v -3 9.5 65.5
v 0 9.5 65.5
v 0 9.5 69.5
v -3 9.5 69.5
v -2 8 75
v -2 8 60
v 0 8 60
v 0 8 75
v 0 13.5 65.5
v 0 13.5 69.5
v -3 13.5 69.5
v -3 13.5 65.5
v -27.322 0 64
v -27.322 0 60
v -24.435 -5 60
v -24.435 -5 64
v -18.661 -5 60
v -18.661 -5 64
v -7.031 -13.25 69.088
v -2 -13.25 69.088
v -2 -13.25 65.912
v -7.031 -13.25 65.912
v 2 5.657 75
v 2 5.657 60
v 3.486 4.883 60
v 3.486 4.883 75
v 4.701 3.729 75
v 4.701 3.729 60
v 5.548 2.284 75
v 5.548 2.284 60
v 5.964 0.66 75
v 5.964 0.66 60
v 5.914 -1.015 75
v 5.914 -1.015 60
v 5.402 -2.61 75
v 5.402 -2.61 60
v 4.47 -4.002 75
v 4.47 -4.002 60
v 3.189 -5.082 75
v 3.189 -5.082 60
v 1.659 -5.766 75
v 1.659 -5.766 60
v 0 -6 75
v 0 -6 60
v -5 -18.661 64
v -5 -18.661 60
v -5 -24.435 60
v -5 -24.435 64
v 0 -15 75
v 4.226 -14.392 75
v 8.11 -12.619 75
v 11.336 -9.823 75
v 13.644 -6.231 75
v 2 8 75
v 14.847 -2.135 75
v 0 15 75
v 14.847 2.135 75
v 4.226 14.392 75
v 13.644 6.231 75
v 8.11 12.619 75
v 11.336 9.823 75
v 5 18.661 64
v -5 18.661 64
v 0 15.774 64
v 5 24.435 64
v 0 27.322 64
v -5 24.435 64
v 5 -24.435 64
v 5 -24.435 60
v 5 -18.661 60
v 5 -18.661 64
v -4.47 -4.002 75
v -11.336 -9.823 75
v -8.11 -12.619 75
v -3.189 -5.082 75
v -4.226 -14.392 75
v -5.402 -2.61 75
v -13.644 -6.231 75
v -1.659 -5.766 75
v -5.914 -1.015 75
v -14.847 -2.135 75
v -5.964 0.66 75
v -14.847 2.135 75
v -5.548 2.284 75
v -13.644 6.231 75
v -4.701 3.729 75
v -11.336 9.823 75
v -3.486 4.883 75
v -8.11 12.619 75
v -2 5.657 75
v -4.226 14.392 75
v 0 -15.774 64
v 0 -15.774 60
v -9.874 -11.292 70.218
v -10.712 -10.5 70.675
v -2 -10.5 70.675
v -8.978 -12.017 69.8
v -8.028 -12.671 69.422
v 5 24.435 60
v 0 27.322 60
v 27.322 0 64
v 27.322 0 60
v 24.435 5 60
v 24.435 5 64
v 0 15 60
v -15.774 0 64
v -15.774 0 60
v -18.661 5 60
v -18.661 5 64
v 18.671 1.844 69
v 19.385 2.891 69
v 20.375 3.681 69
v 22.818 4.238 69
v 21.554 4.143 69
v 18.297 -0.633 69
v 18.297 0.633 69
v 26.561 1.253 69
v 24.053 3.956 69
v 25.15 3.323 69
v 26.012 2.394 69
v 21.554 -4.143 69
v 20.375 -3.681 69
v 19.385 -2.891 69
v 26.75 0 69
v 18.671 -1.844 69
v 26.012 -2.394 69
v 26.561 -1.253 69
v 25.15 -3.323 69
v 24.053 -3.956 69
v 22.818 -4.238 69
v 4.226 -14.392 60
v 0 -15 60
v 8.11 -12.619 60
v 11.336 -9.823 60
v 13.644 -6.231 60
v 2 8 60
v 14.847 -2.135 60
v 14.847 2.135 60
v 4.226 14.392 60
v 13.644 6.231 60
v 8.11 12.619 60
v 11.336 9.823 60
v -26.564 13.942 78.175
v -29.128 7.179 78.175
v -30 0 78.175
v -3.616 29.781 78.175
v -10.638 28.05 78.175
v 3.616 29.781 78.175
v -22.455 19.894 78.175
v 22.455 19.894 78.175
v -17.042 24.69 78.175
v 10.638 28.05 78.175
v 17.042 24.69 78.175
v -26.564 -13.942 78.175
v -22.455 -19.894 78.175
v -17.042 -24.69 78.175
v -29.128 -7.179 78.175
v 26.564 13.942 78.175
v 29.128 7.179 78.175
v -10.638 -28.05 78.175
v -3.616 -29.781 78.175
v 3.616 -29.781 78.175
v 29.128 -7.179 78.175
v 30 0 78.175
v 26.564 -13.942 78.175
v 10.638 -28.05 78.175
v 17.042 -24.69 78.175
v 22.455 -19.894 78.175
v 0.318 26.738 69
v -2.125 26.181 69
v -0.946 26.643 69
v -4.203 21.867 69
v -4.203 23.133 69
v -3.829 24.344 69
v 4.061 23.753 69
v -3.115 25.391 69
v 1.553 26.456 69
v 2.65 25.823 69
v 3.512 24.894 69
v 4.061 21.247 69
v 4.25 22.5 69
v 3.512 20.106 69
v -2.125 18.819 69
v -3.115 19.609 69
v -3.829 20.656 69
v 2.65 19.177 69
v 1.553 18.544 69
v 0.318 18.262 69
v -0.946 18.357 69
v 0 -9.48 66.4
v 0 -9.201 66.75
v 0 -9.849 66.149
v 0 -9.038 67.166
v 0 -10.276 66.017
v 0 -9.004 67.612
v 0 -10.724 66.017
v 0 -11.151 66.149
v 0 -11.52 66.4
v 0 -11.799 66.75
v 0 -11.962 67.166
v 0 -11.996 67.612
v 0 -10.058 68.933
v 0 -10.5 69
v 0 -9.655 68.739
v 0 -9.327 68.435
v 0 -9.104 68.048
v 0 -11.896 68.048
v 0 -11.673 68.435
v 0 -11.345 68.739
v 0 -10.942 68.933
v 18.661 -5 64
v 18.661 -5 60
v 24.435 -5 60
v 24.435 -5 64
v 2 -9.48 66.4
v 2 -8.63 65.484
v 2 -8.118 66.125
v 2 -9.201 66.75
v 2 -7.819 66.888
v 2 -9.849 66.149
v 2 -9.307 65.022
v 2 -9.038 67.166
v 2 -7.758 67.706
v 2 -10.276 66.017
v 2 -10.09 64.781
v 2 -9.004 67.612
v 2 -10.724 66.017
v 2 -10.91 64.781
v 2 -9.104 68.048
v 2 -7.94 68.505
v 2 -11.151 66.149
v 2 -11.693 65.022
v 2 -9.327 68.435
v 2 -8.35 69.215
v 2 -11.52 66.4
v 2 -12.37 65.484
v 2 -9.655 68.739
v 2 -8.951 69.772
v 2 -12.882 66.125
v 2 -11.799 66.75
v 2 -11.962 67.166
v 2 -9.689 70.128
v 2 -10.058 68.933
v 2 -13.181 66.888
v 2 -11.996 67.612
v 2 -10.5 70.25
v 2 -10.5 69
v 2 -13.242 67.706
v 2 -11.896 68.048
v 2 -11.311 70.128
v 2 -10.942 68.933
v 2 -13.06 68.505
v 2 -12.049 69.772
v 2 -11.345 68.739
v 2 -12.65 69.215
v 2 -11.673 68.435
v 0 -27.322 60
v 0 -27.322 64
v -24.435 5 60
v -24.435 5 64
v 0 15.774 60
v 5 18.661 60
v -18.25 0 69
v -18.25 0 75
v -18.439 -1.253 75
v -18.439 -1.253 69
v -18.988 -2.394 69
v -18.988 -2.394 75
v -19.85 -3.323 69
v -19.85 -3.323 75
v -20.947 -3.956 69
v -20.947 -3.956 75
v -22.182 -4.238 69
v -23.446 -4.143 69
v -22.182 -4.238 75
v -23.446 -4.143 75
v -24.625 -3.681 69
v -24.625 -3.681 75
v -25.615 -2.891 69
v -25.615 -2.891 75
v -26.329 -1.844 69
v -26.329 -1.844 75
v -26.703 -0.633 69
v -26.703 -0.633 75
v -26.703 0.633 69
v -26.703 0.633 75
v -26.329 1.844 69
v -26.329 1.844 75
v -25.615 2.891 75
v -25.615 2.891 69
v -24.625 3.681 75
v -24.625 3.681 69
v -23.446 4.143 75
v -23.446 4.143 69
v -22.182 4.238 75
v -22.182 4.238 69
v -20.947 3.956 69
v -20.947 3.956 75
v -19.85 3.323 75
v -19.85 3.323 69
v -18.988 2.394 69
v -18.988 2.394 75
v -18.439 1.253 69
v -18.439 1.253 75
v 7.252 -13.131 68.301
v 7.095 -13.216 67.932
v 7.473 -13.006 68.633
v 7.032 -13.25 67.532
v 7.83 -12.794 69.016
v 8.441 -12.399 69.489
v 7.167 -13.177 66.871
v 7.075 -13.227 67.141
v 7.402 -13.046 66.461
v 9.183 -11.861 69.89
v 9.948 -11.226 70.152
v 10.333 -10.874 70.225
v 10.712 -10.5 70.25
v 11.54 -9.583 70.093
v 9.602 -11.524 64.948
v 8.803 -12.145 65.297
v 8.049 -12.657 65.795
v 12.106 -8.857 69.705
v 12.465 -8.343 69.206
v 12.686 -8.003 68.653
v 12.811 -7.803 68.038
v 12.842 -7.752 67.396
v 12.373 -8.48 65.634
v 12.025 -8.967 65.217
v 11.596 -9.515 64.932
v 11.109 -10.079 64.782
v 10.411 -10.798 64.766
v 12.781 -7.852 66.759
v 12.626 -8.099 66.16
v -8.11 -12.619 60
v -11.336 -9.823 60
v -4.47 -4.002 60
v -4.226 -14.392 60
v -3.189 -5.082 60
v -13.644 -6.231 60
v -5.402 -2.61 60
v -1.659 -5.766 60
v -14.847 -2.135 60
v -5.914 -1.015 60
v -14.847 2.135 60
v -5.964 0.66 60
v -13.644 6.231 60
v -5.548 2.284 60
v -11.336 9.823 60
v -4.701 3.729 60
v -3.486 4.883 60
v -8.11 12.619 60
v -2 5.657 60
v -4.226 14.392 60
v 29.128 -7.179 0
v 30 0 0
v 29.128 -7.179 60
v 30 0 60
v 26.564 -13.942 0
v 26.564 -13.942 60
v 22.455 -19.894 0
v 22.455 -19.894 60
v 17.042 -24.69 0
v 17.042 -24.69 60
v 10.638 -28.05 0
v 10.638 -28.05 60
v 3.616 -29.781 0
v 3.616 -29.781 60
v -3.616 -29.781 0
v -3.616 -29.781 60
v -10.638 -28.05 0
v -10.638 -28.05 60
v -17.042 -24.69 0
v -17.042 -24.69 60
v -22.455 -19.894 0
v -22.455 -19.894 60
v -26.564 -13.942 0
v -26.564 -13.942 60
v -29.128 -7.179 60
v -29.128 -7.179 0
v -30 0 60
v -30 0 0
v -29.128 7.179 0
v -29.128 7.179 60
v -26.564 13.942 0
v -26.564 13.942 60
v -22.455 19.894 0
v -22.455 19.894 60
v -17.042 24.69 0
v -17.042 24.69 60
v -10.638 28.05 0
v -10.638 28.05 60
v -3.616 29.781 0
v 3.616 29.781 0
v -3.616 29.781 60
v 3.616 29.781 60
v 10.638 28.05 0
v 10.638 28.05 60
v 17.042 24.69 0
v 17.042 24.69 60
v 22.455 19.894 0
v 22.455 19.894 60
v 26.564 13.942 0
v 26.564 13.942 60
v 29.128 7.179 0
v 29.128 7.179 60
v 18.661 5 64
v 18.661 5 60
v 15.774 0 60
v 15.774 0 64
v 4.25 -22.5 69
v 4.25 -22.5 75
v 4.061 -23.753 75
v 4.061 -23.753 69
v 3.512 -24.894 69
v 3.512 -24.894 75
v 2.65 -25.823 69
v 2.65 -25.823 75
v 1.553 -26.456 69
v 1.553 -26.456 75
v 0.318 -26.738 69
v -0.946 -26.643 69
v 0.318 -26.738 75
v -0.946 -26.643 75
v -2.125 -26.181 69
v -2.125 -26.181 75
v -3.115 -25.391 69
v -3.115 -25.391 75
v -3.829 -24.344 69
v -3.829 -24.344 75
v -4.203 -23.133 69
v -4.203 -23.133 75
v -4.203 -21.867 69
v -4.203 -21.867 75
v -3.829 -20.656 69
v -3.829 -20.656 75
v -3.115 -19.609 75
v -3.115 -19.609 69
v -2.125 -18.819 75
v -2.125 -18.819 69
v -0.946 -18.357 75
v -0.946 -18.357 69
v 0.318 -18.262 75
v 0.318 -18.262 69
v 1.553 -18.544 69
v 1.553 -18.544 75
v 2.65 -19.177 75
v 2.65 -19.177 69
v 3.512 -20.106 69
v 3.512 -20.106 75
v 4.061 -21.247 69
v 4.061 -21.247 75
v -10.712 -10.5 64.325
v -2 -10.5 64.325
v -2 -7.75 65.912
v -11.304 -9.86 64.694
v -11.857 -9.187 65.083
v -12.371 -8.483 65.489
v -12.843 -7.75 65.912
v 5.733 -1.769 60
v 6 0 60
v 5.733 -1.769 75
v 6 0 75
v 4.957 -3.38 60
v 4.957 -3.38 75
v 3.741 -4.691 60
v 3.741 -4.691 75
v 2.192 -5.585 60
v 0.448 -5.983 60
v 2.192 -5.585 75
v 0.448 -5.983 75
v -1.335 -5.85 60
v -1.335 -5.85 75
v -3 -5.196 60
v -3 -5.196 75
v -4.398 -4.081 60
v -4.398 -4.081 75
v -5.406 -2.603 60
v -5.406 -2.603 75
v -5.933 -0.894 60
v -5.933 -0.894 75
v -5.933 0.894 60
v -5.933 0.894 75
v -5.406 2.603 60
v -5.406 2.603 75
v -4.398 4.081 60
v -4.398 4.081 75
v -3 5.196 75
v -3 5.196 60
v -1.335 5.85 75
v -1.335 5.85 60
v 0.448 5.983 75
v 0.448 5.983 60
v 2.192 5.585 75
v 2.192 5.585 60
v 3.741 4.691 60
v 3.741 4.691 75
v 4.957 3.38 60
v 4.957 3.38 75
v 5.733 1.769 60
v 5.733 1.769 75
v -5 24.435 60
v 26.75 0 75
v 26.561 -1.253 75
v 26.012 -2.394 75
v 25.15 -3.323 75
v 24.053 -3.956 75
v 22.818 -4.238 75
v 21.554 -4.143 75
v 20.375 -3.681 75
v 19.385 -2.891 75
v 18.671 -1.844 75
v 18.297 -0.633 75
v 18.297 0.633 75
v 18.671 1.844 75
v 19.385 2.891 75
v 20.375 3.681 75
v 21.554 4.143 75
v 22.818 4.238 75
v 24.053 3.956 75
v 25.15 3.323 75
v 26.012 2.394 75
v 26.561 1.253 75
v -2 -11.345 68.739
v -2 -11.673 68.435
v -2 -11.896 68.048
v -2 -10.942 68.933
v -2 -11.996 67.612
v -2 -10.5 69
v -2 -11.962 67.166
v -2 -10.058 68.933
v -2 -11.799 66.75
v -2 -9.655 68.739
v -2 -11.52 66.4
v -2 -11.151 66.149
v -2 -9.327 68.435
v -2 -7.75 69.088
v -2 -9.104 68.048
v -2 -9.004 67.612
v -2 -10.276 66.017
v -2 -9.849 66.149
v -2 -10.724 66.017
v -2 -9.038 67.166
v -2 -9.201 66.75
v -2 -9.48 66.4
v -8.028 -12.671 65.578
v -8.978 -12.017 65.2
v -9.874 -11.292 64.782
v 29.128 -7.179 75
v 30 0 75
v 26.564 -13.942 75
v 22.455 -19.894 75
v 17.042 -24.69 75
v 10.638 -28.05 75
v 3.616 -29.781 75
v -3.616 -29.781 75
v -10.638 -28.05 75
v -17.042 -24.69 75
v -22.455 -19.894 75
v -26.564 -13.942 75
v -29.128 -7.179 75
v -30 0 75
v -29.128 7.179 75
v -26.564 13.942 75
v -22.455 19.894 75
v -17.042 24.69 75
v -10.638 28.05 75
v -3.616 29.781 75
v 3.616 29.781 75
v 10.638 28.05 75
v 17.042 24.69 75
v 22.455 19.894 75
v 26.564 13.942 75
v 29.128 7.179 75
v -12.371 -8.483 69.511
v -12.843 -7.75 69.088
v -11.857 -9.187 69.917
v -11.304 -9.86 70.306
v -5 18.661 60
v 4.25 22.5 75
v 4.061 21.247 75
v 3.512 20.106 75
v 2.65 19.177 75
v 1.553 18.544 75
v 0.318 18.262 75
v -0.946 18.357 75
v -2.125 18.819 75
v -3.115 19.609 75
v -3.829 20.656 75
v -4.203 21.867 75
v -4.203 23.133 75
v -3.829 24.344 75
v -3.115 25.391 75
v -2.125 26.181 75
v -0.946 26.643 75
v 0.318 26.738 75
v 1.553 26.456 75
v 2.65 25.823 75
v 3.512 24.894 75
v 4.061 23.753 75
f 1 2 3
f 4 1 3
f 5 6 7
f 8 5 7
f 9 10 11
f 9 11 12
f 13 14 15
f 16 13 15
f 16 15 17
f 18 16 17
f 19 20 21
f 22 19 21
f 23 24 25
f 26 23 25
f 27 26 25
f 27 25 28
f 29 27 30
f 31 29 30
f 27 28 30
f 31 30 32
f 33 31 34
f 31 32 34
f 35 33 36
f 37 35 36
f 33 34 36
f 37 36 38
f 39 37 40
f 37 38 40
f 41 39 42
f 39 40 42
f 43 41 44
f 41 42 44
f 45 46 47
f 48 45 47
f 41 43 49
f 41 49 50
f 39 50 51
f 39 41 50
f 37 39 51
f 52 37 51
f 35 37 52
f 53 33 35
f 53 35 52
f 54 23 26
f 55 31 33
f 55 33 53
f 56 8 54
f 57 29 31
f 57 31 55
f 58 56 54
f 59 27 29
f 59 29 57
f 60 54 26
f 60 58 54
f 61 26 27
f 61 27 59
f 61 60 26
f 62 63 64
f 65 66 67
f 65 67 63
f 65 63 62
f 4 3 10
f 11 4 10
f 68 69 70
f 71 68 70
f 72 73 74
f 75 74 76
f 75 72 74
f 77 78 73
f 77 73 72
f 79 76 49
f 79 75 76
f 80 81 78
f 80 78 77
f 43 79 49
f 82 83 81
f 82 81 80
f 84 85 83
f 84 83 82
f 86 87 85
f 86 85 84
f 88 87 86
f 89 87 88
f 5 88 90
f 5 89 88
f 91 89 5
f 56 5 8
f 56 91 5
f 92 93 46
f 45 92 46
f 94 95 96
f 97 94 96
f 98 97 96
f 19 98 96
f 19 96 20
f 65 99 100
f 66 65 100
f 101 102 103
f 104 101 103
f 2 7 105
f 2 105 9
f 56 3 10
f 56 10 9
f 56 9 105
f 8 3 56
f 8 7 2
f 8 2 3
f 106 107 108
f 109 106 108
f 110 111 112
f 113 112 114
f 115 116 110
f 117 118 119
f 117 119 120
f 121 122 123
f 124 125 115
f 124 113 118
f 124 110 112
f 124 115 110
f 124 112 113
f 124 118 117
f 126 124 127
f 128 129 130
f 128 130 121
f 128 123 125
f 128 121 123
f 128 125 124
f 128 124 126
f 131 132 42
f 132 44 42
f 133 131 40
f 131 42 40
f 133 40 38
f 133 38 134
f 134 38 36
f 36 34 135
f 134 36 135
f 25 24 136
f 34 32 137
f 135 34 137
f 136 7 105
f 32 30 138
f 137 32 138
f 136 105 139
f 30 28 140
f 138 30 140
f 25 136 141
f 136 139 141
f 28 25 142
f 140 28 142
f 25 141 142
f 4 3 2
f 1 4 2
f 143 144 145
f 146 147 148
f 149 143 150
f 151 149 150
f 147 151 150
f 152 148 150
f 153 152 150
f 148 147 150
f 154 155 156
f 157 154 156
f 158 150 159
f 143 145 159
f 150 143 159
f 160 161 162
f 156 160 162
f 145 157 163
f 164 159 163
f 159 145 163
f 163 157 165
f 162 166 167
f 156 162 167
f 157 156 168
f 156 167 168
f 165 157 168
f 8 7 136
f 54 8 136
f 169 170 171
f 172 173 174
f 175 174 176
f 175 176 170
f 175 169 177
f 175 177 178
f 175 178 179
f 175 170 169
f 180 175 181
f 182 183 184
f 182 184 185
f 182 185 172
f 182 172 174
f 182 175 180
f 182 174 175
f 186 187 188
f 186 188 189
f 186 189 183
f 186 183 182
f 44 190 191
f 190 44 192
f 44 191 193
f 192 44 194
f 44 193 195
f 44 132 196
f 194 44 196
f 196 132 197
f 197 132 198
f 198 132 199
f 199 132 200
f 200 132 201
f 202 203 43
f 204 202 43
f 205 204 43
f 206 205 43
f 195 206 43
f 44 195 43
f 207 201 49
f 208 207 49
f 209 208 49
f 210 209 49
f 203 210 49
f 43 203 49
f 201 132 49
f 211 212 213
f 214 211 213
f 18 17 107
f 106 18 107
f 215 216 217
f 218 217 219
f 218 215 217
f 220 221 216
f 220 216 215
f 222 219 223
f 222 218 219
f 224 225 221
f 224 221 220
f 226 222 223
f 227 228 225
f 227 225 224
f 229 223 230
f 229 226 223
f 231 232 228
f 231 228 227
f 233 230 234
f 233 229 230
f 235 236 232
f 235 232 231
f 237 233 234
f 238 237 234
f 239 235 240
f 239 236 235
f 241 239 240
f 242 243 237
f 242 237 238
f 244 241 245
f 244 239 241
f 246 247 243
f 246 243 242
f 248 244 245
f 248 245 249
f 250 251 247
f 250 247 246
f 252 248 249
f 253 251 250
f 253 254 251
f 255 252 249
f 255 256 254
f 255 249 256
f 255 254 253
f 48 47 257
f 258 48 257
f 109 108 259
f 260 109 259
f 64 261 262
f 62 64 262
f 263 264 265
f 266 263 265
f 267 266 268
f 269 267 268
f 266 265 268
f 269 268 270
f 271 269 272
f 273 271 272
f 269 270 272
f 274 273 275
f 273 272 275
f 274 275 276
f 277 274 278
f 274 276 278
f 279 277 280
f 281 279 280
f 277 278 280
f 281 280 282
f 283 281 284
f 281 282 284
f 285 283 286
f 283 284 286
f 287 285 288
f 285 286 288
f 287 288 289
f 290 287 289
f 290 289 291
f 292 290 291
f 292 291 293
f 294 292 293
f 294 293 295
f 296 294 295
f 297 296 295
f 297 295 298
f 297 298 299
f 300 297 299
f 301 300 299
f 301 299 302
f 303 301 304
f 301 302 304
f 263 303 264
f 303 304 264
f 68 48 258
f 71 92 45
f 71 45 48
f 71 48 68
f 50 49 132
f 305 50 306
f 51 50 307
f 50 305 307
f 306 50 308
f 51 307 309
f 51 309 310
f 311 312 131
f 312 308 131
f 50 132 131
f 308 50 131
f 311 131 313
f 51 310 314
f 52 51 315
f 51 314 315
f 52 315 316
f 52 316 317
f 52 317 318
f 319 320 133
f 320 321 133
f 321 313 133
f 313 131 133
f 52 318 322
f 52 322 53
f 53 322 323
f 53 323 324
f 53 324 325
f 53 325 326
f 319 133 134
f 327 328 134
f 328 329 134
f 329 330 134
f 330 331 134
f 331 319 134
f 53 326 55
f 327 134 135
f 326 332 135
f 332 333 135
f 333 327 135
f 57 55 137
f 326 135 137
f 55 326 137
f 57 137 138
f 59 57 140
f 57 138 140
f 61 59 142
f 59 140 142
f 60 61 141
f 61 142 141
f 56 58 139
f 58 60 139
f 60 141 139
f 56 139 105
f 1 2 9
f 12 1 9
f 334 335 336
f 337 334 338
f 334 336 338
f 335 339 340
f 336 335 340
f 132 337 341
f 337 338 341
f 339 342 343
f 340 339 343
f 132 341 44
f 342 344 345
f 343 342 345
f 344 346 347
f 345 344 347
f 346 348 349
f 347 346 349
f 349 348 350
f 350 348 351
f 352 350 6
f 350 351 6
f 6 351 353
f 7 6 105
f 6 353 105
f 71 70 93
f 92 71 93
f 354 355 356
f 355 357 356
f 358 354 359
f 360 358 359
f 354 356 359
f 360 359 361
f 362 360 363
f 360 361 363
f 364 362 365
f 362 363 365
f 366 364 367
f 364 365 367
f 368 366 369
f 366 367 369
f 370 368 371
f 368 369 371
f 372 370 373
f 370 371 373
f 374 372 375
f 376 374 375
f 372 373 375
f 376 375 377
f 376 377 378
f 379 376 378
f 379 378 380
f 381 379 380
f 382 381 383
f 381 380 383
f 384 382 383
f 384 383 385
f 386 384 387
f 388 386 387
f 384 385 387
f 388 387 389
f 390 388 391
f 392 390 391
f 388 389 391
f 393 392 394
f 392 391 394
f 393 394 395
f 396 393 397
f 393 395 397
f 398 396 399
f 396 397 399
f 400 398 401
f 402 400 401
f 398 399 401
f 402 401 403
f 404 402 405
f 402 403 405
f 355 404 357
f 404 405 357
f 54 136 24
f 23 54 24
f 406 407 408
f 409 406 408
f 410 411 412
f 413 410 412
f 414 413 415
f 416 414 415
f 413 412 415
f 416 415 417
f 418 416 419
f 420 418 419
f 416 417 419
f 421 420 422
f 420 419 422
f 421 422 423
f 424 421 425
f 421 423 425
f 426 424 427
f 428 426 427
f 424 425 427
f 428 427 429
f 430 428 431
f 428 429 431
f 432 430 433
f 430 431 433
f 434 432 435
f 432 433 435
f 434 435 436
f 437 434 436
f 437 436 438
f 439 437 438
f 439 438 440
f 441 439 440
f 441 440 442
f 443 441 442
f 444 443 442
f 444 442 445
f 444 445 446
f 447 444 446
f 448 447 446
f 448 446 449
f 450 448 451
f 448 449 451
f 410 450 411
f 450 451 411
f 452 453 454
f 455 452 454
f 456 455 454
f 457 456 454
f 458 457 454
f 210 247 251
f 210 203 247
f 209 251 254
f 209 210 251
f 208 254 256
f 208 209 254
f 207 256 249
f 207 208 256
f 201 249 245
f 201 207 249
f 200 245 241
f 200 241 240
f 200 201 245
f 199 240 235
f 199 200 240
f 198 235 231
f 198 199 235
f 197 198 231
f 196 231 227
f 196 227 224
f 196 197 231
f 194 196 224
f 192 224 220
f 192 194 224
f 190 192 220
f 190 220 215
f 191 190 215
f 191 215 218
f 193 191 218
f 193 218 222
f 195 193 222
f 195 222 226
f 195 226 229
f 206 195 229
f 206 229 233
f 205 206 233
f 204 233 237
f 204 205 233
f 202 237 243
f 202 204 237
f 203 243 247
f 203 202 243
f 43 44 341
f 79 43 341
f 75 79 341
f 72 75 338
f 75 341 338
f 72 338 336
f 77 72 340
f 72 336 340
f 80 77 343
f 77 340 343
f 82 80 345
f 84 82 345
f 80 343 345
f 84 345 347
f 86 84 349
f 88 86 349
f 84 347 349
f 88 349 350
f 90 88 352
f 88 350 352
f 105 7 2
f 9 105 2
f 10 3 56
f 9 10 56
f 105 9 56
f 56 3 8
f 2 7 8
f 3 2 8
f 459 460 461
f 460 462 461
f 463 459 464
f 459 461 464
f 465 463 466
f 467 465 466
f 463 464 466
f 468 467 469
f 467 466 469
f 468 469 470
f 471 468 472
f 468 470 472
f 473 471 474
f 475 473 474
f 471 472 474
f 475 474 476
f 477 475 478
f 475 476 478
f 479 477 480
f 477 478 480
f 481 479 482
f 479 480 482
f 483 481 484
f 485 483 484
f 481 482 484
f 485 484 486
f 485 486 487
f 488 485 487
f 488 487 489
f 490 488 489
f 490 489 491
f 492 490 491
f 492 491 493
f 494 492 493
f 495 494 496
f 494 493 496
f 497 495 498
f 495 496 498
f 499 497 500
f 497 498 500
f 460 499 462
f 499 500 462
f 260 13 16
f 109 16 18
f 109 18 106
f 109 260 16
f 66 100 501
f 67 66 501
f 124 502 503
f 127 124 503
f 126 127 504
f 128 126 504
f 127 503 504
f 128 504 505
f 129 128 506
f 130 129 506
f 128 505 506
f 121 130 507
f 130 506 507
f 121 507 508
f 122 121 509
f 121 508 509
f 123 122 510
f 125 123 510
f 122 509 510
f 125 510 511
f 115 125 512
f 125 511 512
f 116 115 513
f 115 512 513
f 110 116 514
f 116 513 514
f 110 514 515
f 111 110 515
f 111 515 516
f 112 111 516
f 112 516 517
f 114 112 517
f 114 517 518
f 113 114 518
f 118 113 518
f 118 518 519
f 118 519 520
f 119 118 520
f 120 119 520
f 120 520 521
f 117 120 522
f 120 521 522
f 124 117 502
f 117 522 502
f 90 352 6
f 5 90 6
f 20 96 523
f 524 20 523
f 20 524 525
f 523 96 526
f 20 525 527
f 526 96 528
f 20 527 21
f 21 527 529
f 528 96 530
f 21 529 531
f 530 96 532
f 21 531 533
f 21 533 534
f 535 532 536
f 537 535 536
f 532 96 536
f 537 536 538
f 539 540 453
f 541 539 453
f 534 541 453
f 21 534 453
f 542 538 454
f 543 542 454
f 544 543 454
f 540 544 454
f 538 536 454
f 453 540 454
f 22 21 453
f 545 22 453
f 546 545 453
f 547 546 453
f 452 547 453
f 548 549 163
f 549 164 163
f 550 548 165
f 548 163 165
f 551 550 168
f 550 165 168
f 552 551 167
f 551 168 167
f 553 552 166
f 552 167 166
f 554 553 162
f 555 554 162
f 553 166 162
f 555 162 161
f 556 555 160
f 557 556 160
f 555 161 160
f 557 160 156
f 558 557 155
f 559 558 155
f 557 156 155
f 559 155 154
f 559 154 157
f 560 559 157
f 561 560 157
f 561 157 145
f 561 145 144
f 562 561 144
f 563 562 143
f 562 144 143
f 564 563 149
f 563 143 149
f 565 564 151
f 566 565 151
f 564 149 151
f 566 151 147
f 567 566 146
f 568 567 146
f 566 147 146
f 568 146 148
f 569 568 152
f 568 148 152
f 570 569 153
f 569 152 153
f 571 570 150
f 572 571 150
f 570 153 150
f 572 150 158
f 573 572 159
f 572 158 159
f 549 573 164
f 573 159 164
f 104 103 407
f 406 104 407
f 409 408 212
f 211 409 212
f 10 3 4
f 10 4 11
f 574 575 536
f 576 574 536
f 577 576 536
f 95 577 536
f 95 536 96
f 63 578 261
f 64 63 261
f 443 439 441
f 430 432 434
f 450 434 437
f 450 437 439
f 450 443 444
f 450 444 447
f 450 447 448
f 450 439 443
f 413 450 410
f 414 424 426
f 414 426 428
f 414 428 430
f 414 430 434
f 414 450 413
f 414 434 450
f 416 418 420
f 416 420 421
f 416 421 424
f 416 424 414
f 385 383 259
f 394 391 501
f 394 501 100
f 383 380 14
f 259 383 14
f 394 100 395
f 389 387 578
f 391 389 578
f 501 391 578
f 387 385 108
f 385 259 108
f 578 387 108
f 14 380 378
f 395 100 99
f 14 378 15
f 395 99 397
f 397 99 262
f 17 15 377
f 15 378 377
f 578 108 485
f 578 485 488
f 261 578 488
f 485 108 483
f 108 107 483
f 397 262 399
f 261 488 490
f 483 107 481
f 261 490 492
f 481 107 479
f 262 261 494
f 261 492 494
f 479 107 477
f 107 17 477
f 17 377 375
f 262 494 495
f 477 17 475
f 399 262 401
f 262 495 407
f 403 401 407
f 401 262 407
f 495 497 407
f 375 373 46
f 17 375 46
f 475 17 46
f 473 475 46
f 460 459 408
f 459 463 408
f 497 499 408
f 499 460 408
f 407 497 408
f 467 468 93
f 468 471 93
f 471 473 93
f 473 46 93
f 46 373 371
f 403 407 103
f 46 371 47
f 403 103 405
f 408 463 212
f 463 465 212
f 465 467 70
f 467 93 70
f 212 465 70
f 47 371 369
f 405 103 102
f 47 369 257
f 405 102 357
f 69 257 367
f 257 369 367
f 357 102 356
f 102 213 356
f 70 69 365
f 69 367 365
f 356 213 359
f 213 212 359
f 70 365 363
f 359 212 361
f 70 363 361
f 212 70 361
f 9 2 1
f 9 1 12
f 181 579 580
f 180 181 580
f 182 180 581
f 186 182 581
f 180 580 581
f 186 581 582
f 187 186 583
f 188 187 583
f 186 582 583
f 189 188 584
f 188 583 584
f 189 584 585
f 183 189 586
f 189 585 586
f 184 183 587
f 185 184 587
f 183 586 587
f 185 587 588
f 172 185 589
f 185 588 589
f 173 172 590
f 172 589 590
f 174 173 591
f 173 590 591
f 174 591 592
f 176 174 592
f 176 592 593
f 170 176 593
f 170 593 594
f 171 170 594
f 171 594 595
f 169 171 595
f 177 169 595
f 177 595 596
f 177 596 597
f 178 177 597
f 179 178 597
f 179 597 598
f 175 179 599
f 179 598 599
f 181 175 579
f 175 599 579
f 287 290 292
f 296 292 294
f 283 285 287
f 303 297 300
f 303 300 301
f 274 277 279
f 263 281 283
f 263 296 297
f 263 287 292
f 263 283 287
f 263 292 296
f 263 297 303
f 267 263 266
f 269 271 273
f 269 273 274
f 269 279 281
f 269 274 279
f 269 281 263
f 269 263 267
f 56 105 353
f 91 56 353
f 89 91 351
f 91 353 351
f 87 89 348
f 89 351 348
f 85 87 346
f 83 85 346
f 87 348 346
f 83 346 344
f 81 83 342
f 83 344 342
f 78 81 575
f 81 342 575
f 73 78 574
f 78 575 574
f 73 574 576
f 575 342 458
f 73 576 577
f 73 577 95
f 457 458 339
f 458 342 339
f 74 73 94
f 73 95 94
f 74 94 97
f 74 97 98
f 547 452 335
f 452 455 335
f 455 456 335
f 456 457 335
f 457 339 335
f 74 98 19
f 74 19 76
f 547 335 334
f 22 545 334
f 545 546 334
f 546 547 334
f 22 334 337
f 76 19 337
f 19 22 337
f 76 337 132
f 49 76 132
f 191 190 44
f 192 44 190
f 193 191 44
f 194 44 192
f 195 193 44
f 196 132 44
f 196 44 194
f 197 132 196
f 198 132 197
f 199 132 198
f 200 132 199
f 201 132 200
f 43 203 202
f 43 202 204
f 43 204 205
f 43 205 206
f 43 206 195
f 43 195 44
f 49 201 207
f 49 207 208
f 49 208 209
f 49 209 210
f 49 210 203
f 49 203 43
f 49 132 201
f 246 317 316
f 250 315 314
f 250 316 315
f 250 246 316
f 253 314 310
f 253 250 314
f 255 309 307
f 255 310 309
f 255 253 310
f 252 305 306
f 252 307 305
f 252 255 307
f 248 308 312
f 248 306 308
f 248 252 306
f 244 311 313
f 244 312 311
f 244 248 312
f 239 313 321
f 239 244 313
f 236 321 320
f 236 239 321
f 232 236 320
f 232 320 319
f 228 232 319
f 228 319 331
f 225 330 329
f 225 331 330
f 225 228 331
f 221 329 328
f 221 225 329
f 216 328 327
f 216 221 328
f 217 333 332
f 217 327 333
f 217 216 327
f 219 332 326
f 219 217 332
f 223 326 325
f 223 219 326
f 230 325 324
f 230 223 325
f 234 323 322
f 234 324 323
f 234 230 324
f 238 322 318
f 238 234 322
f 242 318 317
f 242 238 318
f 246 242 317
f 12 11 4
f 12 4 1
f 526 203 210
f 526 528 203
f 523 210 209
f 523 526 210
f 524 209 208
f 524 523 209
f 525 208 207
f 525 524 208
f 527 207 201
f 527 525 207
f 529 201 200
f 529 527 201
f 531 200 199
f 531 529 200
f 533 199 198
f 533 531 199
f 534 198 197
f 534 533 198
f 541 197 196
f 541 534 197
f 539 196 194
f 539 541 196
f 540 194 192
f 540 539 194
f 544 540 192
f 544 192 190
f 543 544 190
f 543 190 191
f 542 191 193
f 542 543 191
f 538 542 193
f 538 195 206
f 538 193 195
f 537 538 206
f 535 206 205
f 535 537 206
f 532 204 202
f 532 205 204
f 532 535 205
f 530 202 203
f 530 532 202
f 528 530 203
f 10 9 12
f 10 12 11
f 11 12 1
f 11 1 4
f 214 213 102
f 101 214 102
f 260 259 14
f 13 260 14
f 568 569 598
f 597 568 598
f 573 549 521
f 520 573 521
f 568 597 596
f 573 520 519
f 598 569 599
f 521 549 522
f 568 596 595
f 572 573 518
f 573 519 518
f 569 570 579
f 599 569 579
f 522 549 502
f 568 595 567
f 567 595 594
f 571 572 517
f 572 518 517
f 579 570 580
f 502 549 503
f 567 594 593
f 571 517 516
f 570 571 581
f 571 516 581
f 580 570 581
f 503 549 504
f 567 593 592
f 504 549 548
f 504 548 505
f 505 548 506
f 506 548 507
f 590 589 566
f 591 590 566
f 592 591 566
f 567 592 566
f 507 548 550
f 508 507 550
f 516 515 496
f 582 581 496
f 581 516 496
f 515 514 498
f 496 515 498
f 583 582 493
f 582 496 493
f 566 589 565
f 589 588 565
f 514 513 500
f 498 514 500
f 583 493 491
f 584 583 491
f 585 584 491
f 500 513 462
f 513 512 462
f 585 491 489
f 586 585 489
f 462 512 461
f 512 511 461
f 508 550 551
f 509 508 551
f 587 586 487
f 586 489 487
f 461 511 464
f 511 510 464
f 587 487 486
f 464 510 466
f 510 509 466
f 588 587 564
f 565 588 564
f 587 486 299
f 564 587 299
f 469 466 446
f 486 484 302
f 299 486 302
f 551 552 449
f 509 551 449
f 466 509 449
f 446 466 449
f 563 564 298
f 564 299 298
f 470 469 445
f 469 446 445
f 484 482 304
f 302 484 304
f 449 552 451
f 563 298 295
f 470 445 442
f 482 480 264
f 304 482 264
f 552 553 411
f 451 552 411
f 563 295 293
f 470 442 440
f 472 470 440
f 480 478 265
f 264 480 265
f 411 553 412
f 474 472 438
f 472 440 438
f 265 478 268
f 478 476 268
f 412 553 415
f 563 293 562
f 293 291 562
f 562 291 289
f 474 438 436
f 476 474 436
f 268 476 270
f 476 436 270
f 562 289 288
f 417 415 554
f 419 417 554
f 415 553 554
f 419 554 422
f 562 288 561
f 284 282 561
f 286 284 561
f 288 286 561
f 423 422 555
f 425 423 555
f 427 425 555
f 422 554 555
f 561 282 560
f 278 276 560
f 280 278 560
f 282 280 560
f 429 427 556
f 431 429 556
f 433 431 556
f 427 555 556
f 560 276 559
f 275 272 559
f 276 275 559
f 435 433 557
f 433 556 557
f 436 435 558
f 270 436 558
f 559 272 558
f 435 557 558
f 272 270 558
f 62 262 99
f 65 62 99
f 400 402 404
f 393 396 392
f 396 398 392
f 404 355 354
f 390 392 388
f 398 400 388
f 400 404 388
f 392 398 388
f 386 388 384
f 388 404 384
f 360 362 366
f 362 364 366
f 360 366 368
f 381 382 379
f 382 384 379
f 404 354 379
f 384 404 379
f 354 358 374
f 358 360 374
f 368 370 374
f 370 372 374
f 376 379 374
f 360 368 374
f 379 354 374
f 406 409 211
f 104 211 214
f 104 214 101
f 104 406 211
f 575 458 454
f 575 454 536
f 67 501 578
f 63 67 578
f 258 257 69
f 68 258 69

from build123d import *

# Parameters (mm, degrees)
BOSS_EXTRUDE1_DEPTH     = 4
SKETCH4_R               = 4.25
BOSS_EXTRUDE2_DEPTH     = 6
SKETCH5_R               = 15
BOSS_EXTRUDE3_DEPTH     = 15
CUT_EXTRUDE1_DEPTH      = 2
CUT_EXTRUDE1_DEPTH_BACK = 91.373284908
SKETCH10_W              = 4
SKETCH10_H              = 4
BOSS_EXTRUDE4_DEPTH     = 3
SKETCH11_W              = 4
SKETCH11_H              = 4
CUT_EXTRUDE2_DEPTH      = 3


with BuildPart() as part:
    # Sketch2 → Revolve1 (revolve)
    with BuildSketch(Plane(origin=(0, 0, 0), x_dir=(0, 0, -1), z_dir=(1, 0, 0)), mode=Mode.PRIVATE) as revolve1_sk:
        Polygon((0, 0), (0, 30), (-60, 30), (-60, 6), (-75, 6), (-75, 30), (-78.175, 30), (-78.175, 0), align=None)
    revolve(revolve1_sk.sketch.rotate(Axis((0, 0, 1885.789937519), (0, 0, -1)), 90), axis=Axis((0, 0, 1885.789937519), (0, 0, -1)))

    # Sketch3 → Boss-Extrude1 (add)
    with BuildSketch(Plane.XY.offset(60)):
        Polygon((15.774497248, 0), (18.661248594, -5), (24.434751286, -5), (27.321502632, 0), (24.434751286, 5), (18.661248594, 5), align=None)
        Polygon((0, 15.774497248), (5, 18.661248594), (5, 24.434751286), (0, 27.321502632), (-5, 24.434751286), (-5, 18.661248594), align=None)
        Polygon((0, -15.774497248), (-5, -18.661248594), (-5, -24.434751286), (0, -27.321502632), (5, -24.434751286), (5, -18.661248594), align=None)
        Polygon((-15.774497248, 0), (-18.661248594, 5), (-24.434751286, 5), (-27.321502632, 0), (-24.434751286, -5), (-18.661248594, -5), align=None)
    extrude(amount=BOSS_EXTRUDE1_DEPTH)

    # Sketch4 → Boss-Extrude2 (add)
    with BuildSketch(Plane(origin=(0, 0, 75), x_dir=(-1, 0, 0), z_dir=(0, 0, -1))):
        with Locations(Location((0, 22.5, 0), (0, 0, 180))):
            Circle(SKETCH4_R)
        with Locations(Location((22.5, 0, 0), (0, 0, 180))):
            Circle(SKETCH4_R)
        with Locations(Location((0, -22.5, 0), (0, 0, 180))):
            Circle(SKETCH4_R)
        with Locations(Location((-22.5, 0, 0), (0, 0, 180))):
            Circle(SKETCH4_R)
    extrude(amount=BOSS_EXTRUDE2_DEPTH)


with BuildPart() as body_2:
    # Sketch5 → Boss-Extrude3 (new body)
    with BuildSketch(Plane.XY.offset(60)):
        Circle(SKETCH5_R)
        with BuildLine():
            Line((-2, 5.656854249), (-2, 8))
            Line((-2, 8), (2, 8))
            Line((2, 8), (2, 5.656854249))
            ThreePointArc((2, 5.656854249), (0, -6), (-2, 5.656854249))
        make_face(mode=Mode.SUBTRACT)
    extrude(amount=BOSS_EXTRUDE3_DEPTH)

    # Sketch7 → Cut-Revolve3 (revolve, cut)
    with BuildSketch(Plane.XY.offset(67.5), mode=Mode.PRIVATE) as cut_revolve3_sk:
        Polygon((12.842799539, -10.5), (12.842799539, -7.75), (2, -7.75), (2, -9), (-4, -9), (-4, -10.5), align=None)
    revolve(cut_revolve3_sk.sketch.rotate(Axis((-1000, -10.5, 67.5), (1, 0, 0)), 90), axis=Axis((-1000, -10.5, 67.5), (1, 0, 0)), mode=Mode.SUBTRACT)

    # Sketch9 → Cut-Extrude1 (cut, two sides)
    with BuildSketch(Plane(origin=(-4, 0, 0), x_dir=(0, 0, -1), z_dir=(1, 0, 0))) as cut_extrude1_sk:
        Polygon((-65.91228676, -13.25), (-64.324573519, -10.5), (-65.91228676, -7.75), (-69.08771324, -7.75), (-70.675426481, -10.5), (-69.08771324, -13.25), align=None)
    extrude(amount=CUT_EXTRUDE1_DEPTH, mode=Mode.SUBTRACT)
    extrude(cut_extrude1_sk.sketch, amount=-CUT_EXTRUDE1_DEPTH_BACK, mode=Mode.SUBTRACT)


with BuildPart() as body_3:
    # Split1: the piece on the far side of the plane
    add(body_2.part)
    split(bisect_by=Plane(origin=(0, 0, 0), x_dir=(0, 0, 1), z_dir=(1, 0, 0)), keep=Keep.BOTTOM)

    # Sketch11 → Cut-Extrude2 (cut)
    with BuildSketch(Plane(origin=(0, 0, 0), x_dir=(0, 0, -1), z_dir=(1, 0, 0))):
        with Locations((-67.5, 11.5)):
            Rectangle(SKETCH11_W, SKETCH11_H)
    extrude(amount=-CUT_EXTRUDE2_DEPTH, mode=Mode.SUBTRACT)


with BuildPart() as body_2_1:
    add(body_2.part)

    # Split1
    split(bisect_by=Plane(origin=(0, 0, 0), x_dir=(0, 0, 1), z_dir=(1, 0, 0)), keep=Keep.TOP)

    # Sketch10 → Boss-Extrude4 (add)
    with BuildSketch(Plane.ZY):
        with Locations((67.5, 11.5)):
            Rectangle(SKETCH10_W, SKETCH10_H)
    extrude(amount=BOSS_EXTRUDE4_DEPTH)


solid = Compound([part.part, body_3.part, body_2_1.part])
